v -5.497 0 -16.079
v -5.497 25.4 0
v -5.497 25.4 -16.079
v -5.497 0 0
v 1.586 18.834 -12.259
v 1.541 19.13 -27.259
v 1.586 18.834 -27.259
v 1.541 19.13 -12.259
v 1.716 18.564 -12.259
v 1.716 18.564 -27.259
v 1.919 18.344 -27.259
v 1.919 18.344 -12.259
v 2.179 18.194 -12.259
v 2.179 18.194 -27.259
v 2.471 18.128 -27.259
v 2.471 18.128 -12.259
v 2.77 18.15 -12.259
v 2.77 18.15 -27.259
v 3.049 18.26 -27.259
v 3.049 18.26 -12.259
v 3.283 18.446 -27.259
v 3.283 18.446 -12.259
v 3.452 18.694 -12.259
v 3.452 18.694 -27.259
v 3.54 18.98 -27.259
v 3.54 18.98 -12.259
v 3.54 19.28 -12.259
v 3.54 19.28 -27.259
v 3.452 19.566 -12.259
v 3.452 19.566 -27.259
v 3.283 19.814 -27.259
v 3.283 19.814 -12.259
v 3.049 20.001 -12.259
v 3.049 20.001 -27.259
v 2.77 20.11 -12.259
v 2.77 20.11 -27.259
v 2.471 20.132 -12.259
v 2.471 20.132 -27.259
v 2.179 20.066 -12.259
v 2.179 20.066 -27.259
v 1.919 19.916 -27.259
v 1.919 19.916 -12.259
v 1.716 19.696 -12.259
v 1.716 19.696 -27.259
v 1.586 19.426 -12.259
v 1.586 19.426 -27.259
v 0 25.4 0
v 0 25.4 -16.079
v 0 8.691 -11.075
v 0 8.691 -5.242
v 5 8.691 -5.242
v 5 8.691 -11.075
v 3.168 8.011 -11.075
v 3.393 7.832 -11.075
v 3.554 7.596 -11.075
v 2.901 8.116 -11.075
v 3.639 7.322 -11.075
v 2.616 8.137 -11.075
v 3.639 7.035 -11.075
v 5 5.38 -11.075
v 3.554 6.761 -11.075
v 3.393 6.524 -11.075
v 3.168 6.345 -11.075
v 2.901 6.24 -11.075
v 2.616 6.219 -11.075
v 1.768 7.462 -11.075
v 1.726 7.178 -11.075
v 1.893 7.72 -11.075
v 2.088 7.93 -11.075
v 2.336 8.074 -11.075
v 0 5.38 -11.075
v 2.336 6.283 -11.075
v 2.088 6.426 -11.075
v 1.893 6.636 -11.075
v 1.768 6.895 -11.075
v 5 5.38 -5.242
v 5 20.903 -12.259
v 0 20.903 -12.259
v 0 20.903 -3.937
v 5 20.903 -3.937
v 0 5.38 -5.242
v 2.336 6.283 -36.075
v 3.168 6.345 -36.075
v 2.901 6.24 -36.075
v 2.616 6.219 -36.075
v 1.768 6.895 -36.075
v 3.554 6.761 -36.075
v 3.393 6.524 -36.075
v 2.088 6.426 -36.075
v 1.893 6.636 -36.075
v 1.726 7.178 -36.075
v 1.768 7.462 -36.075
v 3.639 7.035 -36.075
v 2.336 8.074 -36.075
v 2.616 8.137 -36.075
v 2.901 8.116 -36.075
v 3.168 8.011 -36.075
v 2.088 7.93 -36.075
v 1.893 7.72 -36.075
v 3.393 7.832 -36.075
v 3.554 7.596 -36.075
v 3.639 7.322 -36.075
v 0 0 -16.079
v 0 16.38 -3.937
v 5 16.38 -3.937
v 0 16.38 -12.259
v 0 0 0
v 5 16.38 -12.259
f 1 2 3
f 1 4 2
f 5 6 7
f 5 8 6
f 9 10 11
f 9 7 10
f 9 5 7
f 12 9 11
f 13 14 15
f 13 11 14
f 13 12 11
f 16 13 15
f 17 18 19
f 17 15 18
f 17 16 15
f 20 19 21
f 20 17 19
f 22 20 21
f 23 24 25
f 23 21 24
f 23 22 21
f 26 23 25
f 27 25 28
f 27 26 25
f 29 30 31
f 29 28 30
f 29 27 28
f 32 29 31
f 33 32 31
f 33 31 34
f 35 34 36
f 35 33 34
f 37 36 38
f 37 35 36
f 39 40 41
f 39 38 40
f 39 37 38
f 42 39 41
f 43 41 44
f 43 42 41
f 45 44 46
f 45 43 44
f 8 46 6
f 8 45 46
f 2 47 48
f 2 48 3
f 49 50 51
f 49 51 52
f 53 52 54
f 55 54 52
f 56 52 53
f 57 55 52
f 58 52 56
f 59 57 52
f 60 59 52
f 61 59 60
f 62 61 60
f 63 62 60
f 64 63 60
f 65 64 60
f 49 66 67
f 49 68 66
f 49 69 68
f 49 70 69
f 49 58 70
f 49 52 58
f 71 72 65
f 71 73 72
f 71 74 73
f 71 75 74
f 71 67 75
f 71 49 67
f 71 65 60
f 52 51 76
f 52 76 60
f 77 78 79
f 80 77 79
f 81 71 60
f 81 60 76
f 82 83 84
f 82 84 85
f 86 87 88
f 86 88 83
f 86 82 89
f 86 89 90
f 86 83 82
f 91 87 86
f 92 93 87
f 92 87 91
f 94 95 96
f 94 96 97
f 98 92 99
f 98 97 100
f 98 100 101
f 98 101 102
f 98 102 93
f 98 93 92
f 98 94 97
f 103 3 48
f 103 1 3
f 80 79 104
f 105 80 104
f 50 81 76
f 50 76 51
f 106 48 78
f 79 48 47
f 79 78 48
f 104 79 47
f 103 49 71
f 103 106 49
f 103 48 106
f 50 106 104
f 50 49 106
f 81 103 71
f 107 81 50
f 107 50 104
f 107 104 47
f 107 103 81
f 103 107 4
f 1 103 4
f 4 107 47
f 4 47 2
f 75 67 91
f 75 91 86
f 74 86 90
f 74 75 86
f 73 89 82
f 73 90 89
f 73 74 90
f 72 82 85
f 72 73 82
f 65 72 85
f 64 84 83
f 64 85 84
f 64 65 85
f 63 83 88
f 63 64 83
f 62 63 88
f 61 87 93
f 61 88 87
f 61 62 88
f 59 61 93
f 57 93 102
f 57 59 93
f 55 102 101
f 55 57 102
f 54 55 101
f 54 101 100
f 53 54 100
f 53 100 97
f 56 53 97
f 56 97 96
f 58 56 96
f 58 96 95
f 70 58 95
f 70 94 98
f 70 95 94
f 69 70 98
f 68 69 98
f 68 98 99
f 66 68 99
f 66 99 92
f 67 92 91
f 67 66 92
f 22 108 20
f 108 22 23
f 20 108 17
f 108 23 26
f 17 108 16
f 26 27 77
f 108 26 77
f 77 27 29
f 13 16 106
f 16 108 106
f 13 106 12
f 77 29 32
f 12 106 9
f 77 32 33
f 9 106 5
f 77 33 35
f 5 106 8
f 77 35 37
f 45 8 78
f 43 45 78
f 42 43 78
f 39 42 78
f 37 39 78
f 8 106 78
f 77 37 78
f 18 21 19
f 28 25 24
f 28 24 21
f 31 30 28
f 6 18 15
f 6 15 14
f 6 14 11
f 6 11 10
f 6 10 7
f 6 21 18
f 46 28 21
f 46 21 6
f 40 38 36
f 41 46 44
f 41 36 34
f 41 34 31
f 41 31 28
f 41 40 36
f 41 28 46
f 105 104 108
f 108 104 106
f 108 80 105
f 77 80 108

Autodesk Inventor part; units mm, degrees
ref_plane "YZ Plane" through (0, 0, 0) normal (1, 0, 0) x (0, 1, 0)
ref_plane "XZ Plane" through (0, 0, 0) normal (0, 1, 0) x (-1, 0, 0)
ref_plane "XY Plane" through (0, 0, 0) normal (0, 0, 1) x (1, 0, 0)
sketch "Sketch1" plane through (0, 0, 0) normal (0, 1, 0) x (-1, 0, 0)
  line L0 (0, 0) -> (5.4973, 0)
  line L1 (5.4973, 0) -> (5.4973, -16.0791)
  line L2 (5.4973, -16.0791) -> (0, -16.0791)
  line L3 (0, -16.0791) -> (0, 0)
extrude "Extrusion1" add sketch "Sketch1" along normal blind 25.4
sketch "Sketch2" plane through (0, 0, 0) normal (1, 0, 0) x (0, 0, -1)
  line L0 (5.242, 8.6906) -> (11.0751, 8.6906)
  line L1 (11.0751, 8.6906) -> (11.0751, 5.3799)
  line L2 (11.0751, 5.3799) -> (5.242, 5.3799)
  line L3 (5.242, 5.3799) -> (5.242, 8.6906)
  line L4 (12.2594, 20.9027) -> (3.9371, 20.9027)
  line L5 (3.9371, 20.9027) -> (3.9371, 16.3797)
  line L6 (3.9371, 16.3797) -> (12.2594, 16.3797)
  line L7 (12.2594, 16.3797) -> (12.2594, 20.9027)
  point P0 (0, 0)
extrude "Extrusion2" add sketch "Sketch2" along normal blind 5
sketch "Sketch3" plane through (0, 25.4, 0) normal (0, 1, 0) x (1, 0, 0)
  point P0 (0, 0)
sketch "Sketch4" plane through (0, 16.3797, -12.2594) normal (0, 0, -1) x (-1, 0, 0)
  circle A0 centre (-2.546, 2.7504) radius 1.0051
  circle A1 centre (-2.546, -8.9893) radius 0.8063
  point P0 (0, -16.3797)
extrude "Extrusion3" add sketch "Sketch4" along normal blind 15 contours A0
sketch "Sketch5" plane through (0, 5.3799, -11.0751) normal (0, 0, -1) x (-1, 0, 0)
  circle A0 centre (-2.6874, 1.7983) radius 0.9619
  point P0 (0, -5.3799)
extrude "Extrusion4" add sketch "Sketch5" along normal blind 25
properties part number "niharika1"
